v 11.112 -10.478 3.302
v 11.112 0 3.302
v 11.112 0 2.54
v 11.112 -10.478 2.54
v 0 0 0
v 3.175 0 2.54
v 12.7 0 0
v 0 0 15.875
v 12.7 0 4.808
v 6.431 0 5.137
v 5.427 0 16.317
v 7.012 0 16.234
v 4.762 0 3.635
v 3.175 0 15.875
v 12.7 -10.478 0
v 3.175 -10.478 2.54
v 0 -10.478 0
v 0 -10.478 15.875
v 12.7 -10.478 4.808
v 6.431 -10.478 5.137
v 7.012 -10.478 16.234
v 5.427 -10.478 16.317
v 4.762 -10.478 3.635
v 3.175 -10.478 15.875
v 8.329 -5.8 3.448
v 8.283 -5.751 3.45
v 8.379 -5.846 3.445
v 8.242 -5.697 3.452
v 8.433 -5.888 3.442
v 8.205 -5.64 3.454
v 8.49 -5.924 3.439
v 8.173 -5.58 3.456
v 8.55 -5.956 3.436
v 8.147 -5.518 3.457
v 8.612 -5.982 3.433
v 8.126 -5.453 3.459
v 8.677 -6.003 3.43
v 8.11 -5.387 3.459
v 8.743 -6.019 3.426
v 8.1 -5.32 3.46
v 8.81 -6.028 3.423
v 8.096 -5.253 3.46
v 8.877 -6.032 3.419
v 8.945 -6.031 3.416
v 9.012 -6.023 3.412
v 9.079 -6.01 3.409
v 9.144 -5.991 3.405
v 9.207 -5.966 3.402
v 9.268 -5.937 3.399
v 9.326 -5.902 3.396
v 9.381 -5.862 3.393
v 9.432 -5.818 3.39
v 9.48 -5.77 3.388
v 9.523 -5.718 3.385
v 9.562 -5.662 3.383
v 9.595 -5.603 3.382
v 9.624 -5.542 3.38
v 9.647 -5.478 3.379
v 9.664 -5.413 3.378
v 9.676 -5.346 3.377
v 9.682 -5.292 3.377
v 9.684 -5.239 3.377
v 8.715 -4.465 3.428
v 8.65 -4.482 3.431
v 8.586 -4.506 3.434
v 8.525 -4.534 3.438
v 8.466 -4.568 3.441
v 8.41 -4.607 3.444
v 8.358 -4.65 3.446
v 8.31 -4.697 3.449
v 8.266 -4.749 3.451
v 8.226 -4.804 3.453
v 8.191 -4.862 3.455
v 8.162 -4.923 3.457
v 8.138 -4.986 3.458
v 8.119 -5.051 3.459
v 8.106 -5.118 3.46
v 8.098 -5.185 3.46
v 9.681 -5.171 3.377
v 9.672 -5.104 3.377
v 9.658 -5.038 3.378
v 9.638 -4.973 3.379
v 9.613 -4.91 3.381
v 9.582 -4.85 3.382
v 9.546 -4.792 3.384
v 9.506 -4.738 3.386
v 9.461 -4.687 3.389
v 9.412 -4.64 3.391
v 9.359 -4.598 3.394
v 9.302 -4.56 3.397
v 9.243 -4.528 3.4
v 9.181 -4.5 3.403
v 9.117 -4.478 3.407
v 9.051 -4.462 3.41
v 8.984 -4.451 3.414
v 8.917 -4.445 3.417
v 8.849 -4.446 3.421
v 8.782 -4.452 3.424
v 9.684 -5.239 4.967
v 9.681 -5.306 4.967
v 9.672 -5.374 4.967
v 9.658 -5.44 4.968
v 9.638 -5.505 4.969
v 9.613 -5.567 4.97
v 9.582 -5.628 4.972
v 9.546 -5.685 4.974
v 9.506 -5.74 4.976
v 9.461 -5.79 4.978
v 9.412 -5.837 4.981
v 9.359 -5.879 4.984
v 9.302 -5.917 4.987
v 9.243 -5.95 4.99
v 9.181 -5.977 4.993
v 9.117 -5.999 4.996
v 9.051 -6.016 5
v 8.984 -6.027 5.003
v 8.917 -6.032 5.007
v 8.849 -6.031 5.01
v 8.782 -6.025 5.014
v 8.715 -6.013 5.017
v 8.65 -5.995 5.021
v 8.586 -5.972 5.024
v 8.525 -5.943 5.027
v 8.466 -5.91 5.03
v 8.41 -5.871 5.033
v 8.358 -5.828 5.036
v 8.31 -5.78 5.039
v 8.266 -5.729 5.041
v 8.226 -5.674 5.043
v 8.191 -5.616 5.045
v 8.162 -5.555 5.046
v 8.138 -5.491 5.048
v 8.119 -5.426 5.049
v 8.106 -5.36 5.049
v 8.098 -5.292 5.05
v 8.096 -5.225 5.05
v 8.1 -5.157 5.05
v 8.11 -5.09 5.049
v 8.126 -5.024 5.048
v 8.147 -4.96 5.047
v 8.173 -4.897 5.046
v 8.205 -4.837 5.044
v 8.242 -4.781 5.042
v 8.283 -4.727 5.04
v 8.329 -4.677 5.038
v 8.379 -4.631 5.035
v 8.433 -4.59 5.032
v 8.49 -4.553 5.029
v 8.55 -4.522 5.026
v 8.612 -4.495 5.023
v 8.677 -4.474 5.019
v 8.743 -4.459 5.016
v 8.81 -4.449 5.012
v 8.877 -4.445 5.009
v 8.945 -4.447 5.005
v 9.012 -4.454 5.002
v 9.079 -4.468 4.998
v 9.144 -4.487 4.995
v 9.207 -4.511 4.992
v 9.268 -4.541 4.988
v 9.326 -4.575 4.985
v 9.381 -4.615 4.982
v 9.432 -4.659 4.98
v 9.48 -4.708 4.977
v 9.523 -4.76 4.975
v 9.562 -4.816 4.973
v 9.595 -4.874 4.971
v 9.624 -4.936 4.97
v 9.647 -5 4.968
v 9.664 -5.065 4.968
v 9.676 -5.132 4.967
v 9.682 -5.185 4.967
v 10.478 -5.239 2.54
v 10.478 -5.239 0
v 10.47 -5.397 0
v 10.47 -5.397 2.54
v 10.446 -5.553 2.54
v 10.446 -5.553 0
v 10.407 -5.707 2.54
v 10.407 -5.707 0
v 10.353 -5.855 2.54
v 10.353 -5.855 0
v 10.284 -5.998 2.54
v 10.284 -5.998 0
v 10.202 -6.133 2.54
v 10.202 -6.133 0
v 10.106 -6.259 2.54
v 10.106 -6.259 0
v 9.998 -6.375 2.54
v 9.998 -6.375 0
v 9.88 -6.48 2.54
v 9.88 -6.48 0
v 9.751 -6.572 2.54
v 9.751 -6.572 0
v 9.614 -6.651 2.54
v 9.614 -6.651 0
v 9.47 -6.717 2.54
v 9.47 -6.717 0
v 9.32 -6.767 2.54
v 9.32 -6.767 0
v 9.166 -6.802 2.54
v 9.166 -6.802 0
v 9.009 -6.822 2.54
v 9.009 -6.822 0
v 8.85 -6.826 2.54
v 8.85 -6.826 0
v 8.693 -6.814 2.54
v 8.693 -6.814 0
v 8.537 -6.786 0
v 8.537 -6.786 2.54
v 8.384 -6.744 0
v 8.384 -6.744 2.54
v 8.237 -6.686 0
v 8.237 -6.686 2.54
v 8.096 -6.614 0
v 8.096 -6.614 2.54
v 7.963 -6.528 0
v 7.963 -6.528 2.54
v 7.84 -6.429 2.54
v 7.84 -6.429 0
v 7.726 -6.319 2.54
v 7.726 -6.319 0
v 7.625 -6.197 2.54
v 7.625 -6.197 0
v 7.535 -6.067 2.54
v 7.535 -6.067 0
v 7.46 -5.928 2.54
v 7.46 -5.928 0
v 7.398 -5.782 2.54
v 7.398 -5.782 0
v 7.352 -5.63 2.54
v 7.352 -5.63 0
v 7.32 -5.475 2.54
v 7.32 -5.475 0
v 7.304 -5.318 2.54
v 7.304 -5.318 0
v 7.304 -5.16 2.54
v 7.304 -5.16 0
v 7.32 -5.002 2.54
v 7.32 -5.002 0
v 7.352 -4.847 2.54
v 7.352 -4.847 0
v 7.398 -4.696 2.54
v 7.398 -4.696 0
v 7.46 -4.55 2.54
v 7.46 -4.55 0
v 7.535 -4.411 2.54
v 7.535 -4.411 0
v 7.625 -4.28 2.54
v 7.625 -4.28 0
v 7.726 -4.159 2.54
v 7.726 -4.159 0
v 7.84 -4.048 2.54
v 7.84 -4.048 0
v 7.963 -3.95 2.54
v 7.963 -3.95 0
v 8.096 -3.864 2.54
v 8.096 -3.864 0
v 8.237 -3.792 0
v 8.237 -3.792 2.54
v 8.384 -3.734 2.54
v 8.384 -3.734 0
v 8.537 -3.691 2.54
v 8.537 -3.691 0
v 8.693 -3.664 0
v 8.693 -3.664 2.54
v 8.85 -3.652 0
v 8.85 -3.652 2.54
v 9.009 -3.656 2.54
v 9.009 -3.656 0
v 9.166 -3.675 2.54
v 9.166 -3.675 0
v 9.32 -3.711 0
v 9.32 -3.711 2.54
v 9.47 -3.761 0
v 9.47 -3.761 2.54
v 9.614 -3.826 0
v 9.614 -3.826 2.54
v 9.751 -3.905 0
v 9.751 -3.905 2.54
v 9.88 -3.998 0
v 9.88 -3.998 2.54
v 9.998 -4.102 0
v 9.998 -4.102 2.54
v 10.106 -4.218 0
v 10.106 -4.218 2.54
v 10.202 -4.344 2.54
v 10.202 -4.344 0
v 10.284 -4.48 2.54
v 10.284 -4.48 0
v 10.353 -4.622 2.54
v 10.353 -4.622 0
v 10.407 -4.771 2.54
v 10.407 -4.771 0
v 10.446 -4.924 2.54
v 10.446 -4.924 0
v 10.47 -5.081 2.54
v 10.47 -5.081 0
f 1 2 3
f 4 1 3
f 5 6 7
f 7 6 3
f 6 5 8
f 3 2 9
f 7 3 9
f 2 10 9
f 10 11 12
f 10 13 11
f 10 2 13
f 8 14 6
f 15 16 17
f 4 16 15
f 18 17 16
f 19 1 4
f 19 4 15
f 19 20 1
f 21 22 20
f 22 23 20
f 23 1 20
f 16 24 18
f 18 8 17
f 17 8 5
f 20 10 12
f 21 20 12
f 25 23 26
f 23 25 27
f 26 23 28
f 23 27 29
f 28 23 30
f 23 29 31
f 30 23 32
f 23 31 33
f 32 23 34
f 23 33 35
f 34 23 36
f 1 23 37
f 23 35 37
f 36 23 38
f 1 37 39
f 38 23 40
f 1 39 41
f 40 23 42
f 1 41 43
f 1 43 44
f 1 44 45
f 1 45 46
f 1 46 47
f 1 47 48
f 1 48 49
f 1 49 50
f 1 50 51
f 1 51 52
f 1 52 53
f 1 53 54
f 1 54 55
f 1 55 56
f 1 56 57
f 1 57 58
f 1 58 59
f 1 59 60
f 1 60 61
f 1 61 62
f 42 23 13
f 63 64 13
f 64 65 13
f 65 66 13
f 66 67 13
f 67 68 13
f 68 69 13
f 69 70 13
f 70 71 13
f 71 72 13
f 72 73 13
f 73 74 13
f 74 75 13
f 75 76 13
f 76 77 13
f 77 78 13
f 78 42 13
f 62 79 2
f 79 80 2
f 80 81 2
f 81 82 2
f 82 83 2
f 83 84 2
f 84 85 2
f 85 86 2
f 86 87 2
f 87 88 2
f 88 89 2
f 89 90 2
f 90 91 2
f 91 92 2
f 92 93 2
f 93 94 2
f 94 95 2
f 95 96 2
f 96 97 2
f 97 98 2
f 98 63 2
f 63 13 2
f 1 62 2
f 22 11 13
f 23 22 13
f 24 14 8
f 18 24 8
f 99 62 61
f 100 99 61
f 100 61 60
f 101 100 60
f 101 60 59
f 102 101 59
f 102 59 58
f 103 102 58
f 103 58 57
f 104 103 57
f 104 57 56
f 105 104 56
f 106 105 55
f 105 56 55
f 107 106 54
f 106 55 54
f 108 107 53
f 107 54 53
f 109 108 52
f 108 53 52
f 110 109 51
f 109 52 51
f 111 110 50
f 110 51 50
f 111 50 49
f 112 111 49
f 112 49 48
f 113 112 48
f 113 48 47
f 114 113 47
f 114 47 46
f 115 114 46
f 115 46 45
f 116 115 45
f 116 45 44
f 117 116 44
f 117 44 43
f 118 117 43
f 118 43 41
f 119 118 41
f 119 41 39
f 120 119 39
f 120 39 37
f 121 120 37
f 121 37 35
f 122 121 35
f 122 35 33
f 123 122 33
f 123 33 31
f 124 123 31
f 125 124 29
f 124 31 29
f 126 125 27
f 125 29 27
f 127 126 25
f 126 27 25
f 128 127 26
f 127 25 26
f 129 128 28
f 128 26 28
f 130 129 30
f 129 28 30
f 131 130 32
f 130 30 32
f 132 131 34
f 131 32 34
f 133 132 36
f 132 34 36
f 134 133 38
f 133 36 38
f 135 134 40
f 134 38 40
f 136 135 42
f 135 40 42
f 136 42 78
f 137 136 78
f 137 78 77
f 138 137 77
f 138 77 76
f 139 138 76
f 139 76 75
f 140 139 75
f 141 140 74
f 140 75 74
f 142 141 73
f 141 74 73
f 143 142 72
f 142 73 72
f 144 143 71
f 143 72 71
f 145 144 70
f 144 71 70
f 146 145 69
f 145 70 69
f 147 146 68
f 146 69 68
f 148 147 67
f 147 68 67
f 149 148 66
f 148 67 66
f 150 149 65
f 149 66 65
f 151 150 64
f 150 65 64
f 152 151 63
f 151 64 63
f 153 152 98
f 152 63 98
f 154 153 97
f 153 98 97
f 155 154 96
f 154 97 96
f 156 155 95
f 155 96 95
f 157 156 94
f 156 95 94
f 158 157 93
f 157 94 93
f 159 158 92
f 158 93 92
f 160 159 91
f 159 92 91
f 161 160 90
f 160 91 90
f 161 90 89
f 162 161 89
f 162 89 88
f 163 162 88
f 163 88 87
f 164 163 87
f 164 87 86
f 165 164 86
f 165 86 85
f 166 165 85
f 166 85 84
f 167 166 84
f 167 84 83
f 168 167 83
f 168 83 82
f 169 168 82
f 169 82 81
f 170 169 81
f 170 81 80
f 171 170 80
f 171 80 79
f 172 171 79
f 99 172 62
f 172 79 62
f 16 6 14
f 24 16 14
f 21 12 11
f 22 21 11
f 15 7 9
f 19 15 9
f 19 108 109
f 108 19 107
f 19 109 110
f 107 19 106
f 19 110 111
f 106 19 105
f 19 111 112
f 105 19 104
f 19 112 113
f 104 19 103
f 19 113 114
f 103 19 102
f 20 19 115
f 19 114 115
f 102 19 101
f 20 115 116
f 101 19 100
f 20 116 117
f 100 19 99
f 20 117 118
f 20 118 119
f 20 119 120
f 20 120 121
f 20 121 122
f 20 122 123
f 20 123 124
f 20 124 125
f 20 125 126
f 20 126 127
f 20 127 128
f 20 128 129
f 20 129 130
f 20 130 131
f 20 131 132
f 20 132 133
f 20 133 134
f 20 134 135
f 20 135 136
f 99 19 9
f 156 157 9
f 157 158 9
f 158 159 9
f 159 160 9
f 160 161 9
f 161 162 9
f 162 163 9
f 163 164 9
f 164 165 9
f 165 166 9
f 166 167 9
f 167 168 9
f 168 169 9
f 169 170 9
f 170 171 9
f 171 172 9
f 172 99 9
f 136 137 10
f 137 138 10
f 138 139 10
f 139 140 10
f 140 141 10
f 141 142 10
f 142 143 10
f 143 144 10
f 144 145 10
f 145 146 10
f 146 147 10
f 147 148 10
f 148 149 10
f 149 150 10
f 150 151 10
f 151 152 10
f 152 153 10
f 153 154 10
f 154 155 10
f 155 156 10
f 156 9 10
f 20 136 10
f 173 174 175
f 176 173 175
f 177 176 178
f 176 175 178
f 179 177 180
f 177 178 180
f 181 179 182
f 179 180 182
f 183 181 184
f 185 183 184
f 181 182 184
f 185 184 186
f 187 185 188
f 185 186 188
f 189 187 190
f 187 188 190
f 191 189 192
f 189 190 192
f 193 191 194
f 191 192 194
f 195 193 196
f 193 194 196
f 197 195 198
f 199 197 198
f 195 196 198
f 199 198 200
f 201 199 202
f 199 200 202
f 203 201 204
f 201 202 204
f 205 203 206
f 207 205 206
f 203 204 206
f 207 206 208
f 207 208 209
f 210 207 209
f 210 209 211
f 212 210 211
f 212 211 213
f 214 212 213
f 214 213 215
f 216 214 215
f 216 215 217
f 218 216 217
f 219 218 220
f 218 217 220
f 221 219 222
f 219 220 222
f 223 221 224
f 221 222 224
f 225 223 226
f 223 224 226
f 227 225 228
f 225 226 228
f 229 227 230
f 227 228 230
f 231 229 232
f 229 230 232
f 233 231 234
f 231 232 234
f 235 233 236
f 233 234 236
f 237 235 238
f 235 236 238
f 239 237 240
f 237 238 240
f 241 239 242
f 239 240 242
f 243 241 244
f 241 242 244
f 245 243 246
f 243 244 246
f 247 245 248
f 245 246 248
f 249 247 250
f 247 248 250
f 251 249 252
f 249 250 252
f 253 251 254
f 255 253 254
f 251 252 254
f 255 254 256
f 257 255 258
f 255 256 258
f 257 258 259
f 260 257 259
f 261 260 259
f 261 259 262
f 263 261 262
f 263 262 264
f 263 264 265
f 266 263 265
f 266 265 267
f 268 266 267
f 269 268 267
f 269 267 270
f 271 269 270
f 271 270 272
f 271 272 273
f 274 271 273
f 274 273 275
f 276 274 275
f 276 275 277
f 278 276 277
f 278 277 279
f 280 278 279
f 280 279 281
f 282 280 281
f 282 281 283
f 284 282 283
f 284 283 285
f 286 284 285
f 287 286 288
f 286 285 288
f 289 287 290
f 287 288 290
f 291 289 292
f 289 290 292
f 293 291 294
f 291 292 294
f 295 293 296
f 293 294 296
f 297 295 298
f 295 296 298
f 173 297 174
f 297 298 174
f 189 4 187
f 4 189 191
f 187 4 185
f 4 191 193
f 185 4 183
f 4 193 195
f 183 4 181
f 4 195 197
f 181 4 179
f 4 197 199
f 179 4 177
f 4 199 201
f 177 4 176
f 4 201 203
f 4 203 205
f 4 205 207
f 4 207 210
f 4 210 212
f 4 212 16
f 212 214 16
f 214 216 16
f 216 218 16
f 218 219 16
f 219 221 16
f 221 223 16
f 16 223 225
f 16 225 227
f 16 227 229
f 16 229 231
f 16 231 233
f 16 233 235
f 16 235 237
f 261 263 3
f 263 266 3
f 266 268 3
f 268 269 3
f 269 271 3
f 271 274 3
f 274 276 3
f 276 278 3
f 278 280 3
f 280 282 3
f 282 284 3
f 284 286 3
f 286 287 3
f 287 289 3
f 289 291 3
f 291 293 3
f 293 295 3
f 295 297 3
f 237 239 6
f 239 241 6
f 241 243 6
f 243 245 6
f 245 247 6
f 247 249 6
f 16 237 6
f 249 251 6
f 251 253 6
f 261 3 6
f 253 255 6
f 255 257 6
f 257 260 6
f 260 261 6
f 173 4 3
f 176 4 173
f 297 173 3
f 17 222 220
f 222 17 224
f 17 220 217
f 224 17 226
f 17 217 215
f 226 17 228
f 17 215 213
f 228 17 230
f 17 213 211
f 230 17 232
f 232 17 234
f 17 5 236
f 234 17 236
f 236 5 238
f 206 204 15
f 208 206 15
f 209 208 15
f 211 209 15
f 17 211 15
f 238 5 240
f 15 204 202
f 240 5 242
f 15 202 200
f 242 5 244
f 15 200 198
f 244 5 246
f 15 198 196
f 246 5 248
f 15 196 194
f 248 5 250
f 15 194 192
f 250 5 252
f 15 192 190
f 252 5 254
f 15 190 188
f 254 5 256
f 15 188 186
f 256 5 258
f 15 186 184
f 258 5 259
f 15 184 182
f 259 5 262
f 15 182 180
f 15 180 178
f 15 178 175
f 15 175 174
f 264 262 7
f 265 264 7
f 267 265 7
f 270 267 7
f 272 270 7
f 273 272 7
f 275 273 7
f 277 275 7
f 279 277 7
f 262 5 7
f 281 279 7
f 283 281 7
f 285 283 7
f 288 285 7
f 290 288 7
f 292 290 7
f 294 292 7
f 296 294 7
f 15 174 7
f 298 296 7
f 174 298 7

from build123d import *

# Parameters (mm, degrees)
F1_DEPTH = 10.4775
F2_R     = 1.5875
F3_DEPTH = 2.54
F4_R     = 0.79375
F5_DEPTH = 16.318384


with BuildPart() as f1:
    # F0 (on Front) → F1 (new body)
    with BuildSketch(Plane.XZ):
        Polygon((3.175, 15.875), (0, 15.875), (0, 0), (12.7, 0), (12.7, 4.808481), (6.430908, 5.13703), (7.012491, 16.234301), (5.427167, 16.317384), (4.7625, 3.634789), (11.1125, 3.302), (11.1125, 2.54), (3.175, 2.54), align=None)
    extrude(amount=F1_DEPTH)

    # F2 (on face) → F3 (cut)
    with BuildSketch(Plane(origin=(0, 0, 0), x_dir=(1, 0, 0), z_dir=(0, 0, -1))):
        with Locations((8.89, 5.23875)):
            Circle(F2_R)
    extrude(amount=-F3_DEPTH, mode=Mode.SUBTRACT)

    # F4 (on face) → F5 (cut, through all)
    with BuildSketch(Plane(origin=(0, 0, 0), x_dir=(1, 0, 0), z_dir=(0, 0, -1))):
        with Locations((8.89, 5.23875)):
            Circle(F4_R)
    extrude(amount=-F5_DEPTH, mode=Mode.SUBTRACT)


solid = f1.part
